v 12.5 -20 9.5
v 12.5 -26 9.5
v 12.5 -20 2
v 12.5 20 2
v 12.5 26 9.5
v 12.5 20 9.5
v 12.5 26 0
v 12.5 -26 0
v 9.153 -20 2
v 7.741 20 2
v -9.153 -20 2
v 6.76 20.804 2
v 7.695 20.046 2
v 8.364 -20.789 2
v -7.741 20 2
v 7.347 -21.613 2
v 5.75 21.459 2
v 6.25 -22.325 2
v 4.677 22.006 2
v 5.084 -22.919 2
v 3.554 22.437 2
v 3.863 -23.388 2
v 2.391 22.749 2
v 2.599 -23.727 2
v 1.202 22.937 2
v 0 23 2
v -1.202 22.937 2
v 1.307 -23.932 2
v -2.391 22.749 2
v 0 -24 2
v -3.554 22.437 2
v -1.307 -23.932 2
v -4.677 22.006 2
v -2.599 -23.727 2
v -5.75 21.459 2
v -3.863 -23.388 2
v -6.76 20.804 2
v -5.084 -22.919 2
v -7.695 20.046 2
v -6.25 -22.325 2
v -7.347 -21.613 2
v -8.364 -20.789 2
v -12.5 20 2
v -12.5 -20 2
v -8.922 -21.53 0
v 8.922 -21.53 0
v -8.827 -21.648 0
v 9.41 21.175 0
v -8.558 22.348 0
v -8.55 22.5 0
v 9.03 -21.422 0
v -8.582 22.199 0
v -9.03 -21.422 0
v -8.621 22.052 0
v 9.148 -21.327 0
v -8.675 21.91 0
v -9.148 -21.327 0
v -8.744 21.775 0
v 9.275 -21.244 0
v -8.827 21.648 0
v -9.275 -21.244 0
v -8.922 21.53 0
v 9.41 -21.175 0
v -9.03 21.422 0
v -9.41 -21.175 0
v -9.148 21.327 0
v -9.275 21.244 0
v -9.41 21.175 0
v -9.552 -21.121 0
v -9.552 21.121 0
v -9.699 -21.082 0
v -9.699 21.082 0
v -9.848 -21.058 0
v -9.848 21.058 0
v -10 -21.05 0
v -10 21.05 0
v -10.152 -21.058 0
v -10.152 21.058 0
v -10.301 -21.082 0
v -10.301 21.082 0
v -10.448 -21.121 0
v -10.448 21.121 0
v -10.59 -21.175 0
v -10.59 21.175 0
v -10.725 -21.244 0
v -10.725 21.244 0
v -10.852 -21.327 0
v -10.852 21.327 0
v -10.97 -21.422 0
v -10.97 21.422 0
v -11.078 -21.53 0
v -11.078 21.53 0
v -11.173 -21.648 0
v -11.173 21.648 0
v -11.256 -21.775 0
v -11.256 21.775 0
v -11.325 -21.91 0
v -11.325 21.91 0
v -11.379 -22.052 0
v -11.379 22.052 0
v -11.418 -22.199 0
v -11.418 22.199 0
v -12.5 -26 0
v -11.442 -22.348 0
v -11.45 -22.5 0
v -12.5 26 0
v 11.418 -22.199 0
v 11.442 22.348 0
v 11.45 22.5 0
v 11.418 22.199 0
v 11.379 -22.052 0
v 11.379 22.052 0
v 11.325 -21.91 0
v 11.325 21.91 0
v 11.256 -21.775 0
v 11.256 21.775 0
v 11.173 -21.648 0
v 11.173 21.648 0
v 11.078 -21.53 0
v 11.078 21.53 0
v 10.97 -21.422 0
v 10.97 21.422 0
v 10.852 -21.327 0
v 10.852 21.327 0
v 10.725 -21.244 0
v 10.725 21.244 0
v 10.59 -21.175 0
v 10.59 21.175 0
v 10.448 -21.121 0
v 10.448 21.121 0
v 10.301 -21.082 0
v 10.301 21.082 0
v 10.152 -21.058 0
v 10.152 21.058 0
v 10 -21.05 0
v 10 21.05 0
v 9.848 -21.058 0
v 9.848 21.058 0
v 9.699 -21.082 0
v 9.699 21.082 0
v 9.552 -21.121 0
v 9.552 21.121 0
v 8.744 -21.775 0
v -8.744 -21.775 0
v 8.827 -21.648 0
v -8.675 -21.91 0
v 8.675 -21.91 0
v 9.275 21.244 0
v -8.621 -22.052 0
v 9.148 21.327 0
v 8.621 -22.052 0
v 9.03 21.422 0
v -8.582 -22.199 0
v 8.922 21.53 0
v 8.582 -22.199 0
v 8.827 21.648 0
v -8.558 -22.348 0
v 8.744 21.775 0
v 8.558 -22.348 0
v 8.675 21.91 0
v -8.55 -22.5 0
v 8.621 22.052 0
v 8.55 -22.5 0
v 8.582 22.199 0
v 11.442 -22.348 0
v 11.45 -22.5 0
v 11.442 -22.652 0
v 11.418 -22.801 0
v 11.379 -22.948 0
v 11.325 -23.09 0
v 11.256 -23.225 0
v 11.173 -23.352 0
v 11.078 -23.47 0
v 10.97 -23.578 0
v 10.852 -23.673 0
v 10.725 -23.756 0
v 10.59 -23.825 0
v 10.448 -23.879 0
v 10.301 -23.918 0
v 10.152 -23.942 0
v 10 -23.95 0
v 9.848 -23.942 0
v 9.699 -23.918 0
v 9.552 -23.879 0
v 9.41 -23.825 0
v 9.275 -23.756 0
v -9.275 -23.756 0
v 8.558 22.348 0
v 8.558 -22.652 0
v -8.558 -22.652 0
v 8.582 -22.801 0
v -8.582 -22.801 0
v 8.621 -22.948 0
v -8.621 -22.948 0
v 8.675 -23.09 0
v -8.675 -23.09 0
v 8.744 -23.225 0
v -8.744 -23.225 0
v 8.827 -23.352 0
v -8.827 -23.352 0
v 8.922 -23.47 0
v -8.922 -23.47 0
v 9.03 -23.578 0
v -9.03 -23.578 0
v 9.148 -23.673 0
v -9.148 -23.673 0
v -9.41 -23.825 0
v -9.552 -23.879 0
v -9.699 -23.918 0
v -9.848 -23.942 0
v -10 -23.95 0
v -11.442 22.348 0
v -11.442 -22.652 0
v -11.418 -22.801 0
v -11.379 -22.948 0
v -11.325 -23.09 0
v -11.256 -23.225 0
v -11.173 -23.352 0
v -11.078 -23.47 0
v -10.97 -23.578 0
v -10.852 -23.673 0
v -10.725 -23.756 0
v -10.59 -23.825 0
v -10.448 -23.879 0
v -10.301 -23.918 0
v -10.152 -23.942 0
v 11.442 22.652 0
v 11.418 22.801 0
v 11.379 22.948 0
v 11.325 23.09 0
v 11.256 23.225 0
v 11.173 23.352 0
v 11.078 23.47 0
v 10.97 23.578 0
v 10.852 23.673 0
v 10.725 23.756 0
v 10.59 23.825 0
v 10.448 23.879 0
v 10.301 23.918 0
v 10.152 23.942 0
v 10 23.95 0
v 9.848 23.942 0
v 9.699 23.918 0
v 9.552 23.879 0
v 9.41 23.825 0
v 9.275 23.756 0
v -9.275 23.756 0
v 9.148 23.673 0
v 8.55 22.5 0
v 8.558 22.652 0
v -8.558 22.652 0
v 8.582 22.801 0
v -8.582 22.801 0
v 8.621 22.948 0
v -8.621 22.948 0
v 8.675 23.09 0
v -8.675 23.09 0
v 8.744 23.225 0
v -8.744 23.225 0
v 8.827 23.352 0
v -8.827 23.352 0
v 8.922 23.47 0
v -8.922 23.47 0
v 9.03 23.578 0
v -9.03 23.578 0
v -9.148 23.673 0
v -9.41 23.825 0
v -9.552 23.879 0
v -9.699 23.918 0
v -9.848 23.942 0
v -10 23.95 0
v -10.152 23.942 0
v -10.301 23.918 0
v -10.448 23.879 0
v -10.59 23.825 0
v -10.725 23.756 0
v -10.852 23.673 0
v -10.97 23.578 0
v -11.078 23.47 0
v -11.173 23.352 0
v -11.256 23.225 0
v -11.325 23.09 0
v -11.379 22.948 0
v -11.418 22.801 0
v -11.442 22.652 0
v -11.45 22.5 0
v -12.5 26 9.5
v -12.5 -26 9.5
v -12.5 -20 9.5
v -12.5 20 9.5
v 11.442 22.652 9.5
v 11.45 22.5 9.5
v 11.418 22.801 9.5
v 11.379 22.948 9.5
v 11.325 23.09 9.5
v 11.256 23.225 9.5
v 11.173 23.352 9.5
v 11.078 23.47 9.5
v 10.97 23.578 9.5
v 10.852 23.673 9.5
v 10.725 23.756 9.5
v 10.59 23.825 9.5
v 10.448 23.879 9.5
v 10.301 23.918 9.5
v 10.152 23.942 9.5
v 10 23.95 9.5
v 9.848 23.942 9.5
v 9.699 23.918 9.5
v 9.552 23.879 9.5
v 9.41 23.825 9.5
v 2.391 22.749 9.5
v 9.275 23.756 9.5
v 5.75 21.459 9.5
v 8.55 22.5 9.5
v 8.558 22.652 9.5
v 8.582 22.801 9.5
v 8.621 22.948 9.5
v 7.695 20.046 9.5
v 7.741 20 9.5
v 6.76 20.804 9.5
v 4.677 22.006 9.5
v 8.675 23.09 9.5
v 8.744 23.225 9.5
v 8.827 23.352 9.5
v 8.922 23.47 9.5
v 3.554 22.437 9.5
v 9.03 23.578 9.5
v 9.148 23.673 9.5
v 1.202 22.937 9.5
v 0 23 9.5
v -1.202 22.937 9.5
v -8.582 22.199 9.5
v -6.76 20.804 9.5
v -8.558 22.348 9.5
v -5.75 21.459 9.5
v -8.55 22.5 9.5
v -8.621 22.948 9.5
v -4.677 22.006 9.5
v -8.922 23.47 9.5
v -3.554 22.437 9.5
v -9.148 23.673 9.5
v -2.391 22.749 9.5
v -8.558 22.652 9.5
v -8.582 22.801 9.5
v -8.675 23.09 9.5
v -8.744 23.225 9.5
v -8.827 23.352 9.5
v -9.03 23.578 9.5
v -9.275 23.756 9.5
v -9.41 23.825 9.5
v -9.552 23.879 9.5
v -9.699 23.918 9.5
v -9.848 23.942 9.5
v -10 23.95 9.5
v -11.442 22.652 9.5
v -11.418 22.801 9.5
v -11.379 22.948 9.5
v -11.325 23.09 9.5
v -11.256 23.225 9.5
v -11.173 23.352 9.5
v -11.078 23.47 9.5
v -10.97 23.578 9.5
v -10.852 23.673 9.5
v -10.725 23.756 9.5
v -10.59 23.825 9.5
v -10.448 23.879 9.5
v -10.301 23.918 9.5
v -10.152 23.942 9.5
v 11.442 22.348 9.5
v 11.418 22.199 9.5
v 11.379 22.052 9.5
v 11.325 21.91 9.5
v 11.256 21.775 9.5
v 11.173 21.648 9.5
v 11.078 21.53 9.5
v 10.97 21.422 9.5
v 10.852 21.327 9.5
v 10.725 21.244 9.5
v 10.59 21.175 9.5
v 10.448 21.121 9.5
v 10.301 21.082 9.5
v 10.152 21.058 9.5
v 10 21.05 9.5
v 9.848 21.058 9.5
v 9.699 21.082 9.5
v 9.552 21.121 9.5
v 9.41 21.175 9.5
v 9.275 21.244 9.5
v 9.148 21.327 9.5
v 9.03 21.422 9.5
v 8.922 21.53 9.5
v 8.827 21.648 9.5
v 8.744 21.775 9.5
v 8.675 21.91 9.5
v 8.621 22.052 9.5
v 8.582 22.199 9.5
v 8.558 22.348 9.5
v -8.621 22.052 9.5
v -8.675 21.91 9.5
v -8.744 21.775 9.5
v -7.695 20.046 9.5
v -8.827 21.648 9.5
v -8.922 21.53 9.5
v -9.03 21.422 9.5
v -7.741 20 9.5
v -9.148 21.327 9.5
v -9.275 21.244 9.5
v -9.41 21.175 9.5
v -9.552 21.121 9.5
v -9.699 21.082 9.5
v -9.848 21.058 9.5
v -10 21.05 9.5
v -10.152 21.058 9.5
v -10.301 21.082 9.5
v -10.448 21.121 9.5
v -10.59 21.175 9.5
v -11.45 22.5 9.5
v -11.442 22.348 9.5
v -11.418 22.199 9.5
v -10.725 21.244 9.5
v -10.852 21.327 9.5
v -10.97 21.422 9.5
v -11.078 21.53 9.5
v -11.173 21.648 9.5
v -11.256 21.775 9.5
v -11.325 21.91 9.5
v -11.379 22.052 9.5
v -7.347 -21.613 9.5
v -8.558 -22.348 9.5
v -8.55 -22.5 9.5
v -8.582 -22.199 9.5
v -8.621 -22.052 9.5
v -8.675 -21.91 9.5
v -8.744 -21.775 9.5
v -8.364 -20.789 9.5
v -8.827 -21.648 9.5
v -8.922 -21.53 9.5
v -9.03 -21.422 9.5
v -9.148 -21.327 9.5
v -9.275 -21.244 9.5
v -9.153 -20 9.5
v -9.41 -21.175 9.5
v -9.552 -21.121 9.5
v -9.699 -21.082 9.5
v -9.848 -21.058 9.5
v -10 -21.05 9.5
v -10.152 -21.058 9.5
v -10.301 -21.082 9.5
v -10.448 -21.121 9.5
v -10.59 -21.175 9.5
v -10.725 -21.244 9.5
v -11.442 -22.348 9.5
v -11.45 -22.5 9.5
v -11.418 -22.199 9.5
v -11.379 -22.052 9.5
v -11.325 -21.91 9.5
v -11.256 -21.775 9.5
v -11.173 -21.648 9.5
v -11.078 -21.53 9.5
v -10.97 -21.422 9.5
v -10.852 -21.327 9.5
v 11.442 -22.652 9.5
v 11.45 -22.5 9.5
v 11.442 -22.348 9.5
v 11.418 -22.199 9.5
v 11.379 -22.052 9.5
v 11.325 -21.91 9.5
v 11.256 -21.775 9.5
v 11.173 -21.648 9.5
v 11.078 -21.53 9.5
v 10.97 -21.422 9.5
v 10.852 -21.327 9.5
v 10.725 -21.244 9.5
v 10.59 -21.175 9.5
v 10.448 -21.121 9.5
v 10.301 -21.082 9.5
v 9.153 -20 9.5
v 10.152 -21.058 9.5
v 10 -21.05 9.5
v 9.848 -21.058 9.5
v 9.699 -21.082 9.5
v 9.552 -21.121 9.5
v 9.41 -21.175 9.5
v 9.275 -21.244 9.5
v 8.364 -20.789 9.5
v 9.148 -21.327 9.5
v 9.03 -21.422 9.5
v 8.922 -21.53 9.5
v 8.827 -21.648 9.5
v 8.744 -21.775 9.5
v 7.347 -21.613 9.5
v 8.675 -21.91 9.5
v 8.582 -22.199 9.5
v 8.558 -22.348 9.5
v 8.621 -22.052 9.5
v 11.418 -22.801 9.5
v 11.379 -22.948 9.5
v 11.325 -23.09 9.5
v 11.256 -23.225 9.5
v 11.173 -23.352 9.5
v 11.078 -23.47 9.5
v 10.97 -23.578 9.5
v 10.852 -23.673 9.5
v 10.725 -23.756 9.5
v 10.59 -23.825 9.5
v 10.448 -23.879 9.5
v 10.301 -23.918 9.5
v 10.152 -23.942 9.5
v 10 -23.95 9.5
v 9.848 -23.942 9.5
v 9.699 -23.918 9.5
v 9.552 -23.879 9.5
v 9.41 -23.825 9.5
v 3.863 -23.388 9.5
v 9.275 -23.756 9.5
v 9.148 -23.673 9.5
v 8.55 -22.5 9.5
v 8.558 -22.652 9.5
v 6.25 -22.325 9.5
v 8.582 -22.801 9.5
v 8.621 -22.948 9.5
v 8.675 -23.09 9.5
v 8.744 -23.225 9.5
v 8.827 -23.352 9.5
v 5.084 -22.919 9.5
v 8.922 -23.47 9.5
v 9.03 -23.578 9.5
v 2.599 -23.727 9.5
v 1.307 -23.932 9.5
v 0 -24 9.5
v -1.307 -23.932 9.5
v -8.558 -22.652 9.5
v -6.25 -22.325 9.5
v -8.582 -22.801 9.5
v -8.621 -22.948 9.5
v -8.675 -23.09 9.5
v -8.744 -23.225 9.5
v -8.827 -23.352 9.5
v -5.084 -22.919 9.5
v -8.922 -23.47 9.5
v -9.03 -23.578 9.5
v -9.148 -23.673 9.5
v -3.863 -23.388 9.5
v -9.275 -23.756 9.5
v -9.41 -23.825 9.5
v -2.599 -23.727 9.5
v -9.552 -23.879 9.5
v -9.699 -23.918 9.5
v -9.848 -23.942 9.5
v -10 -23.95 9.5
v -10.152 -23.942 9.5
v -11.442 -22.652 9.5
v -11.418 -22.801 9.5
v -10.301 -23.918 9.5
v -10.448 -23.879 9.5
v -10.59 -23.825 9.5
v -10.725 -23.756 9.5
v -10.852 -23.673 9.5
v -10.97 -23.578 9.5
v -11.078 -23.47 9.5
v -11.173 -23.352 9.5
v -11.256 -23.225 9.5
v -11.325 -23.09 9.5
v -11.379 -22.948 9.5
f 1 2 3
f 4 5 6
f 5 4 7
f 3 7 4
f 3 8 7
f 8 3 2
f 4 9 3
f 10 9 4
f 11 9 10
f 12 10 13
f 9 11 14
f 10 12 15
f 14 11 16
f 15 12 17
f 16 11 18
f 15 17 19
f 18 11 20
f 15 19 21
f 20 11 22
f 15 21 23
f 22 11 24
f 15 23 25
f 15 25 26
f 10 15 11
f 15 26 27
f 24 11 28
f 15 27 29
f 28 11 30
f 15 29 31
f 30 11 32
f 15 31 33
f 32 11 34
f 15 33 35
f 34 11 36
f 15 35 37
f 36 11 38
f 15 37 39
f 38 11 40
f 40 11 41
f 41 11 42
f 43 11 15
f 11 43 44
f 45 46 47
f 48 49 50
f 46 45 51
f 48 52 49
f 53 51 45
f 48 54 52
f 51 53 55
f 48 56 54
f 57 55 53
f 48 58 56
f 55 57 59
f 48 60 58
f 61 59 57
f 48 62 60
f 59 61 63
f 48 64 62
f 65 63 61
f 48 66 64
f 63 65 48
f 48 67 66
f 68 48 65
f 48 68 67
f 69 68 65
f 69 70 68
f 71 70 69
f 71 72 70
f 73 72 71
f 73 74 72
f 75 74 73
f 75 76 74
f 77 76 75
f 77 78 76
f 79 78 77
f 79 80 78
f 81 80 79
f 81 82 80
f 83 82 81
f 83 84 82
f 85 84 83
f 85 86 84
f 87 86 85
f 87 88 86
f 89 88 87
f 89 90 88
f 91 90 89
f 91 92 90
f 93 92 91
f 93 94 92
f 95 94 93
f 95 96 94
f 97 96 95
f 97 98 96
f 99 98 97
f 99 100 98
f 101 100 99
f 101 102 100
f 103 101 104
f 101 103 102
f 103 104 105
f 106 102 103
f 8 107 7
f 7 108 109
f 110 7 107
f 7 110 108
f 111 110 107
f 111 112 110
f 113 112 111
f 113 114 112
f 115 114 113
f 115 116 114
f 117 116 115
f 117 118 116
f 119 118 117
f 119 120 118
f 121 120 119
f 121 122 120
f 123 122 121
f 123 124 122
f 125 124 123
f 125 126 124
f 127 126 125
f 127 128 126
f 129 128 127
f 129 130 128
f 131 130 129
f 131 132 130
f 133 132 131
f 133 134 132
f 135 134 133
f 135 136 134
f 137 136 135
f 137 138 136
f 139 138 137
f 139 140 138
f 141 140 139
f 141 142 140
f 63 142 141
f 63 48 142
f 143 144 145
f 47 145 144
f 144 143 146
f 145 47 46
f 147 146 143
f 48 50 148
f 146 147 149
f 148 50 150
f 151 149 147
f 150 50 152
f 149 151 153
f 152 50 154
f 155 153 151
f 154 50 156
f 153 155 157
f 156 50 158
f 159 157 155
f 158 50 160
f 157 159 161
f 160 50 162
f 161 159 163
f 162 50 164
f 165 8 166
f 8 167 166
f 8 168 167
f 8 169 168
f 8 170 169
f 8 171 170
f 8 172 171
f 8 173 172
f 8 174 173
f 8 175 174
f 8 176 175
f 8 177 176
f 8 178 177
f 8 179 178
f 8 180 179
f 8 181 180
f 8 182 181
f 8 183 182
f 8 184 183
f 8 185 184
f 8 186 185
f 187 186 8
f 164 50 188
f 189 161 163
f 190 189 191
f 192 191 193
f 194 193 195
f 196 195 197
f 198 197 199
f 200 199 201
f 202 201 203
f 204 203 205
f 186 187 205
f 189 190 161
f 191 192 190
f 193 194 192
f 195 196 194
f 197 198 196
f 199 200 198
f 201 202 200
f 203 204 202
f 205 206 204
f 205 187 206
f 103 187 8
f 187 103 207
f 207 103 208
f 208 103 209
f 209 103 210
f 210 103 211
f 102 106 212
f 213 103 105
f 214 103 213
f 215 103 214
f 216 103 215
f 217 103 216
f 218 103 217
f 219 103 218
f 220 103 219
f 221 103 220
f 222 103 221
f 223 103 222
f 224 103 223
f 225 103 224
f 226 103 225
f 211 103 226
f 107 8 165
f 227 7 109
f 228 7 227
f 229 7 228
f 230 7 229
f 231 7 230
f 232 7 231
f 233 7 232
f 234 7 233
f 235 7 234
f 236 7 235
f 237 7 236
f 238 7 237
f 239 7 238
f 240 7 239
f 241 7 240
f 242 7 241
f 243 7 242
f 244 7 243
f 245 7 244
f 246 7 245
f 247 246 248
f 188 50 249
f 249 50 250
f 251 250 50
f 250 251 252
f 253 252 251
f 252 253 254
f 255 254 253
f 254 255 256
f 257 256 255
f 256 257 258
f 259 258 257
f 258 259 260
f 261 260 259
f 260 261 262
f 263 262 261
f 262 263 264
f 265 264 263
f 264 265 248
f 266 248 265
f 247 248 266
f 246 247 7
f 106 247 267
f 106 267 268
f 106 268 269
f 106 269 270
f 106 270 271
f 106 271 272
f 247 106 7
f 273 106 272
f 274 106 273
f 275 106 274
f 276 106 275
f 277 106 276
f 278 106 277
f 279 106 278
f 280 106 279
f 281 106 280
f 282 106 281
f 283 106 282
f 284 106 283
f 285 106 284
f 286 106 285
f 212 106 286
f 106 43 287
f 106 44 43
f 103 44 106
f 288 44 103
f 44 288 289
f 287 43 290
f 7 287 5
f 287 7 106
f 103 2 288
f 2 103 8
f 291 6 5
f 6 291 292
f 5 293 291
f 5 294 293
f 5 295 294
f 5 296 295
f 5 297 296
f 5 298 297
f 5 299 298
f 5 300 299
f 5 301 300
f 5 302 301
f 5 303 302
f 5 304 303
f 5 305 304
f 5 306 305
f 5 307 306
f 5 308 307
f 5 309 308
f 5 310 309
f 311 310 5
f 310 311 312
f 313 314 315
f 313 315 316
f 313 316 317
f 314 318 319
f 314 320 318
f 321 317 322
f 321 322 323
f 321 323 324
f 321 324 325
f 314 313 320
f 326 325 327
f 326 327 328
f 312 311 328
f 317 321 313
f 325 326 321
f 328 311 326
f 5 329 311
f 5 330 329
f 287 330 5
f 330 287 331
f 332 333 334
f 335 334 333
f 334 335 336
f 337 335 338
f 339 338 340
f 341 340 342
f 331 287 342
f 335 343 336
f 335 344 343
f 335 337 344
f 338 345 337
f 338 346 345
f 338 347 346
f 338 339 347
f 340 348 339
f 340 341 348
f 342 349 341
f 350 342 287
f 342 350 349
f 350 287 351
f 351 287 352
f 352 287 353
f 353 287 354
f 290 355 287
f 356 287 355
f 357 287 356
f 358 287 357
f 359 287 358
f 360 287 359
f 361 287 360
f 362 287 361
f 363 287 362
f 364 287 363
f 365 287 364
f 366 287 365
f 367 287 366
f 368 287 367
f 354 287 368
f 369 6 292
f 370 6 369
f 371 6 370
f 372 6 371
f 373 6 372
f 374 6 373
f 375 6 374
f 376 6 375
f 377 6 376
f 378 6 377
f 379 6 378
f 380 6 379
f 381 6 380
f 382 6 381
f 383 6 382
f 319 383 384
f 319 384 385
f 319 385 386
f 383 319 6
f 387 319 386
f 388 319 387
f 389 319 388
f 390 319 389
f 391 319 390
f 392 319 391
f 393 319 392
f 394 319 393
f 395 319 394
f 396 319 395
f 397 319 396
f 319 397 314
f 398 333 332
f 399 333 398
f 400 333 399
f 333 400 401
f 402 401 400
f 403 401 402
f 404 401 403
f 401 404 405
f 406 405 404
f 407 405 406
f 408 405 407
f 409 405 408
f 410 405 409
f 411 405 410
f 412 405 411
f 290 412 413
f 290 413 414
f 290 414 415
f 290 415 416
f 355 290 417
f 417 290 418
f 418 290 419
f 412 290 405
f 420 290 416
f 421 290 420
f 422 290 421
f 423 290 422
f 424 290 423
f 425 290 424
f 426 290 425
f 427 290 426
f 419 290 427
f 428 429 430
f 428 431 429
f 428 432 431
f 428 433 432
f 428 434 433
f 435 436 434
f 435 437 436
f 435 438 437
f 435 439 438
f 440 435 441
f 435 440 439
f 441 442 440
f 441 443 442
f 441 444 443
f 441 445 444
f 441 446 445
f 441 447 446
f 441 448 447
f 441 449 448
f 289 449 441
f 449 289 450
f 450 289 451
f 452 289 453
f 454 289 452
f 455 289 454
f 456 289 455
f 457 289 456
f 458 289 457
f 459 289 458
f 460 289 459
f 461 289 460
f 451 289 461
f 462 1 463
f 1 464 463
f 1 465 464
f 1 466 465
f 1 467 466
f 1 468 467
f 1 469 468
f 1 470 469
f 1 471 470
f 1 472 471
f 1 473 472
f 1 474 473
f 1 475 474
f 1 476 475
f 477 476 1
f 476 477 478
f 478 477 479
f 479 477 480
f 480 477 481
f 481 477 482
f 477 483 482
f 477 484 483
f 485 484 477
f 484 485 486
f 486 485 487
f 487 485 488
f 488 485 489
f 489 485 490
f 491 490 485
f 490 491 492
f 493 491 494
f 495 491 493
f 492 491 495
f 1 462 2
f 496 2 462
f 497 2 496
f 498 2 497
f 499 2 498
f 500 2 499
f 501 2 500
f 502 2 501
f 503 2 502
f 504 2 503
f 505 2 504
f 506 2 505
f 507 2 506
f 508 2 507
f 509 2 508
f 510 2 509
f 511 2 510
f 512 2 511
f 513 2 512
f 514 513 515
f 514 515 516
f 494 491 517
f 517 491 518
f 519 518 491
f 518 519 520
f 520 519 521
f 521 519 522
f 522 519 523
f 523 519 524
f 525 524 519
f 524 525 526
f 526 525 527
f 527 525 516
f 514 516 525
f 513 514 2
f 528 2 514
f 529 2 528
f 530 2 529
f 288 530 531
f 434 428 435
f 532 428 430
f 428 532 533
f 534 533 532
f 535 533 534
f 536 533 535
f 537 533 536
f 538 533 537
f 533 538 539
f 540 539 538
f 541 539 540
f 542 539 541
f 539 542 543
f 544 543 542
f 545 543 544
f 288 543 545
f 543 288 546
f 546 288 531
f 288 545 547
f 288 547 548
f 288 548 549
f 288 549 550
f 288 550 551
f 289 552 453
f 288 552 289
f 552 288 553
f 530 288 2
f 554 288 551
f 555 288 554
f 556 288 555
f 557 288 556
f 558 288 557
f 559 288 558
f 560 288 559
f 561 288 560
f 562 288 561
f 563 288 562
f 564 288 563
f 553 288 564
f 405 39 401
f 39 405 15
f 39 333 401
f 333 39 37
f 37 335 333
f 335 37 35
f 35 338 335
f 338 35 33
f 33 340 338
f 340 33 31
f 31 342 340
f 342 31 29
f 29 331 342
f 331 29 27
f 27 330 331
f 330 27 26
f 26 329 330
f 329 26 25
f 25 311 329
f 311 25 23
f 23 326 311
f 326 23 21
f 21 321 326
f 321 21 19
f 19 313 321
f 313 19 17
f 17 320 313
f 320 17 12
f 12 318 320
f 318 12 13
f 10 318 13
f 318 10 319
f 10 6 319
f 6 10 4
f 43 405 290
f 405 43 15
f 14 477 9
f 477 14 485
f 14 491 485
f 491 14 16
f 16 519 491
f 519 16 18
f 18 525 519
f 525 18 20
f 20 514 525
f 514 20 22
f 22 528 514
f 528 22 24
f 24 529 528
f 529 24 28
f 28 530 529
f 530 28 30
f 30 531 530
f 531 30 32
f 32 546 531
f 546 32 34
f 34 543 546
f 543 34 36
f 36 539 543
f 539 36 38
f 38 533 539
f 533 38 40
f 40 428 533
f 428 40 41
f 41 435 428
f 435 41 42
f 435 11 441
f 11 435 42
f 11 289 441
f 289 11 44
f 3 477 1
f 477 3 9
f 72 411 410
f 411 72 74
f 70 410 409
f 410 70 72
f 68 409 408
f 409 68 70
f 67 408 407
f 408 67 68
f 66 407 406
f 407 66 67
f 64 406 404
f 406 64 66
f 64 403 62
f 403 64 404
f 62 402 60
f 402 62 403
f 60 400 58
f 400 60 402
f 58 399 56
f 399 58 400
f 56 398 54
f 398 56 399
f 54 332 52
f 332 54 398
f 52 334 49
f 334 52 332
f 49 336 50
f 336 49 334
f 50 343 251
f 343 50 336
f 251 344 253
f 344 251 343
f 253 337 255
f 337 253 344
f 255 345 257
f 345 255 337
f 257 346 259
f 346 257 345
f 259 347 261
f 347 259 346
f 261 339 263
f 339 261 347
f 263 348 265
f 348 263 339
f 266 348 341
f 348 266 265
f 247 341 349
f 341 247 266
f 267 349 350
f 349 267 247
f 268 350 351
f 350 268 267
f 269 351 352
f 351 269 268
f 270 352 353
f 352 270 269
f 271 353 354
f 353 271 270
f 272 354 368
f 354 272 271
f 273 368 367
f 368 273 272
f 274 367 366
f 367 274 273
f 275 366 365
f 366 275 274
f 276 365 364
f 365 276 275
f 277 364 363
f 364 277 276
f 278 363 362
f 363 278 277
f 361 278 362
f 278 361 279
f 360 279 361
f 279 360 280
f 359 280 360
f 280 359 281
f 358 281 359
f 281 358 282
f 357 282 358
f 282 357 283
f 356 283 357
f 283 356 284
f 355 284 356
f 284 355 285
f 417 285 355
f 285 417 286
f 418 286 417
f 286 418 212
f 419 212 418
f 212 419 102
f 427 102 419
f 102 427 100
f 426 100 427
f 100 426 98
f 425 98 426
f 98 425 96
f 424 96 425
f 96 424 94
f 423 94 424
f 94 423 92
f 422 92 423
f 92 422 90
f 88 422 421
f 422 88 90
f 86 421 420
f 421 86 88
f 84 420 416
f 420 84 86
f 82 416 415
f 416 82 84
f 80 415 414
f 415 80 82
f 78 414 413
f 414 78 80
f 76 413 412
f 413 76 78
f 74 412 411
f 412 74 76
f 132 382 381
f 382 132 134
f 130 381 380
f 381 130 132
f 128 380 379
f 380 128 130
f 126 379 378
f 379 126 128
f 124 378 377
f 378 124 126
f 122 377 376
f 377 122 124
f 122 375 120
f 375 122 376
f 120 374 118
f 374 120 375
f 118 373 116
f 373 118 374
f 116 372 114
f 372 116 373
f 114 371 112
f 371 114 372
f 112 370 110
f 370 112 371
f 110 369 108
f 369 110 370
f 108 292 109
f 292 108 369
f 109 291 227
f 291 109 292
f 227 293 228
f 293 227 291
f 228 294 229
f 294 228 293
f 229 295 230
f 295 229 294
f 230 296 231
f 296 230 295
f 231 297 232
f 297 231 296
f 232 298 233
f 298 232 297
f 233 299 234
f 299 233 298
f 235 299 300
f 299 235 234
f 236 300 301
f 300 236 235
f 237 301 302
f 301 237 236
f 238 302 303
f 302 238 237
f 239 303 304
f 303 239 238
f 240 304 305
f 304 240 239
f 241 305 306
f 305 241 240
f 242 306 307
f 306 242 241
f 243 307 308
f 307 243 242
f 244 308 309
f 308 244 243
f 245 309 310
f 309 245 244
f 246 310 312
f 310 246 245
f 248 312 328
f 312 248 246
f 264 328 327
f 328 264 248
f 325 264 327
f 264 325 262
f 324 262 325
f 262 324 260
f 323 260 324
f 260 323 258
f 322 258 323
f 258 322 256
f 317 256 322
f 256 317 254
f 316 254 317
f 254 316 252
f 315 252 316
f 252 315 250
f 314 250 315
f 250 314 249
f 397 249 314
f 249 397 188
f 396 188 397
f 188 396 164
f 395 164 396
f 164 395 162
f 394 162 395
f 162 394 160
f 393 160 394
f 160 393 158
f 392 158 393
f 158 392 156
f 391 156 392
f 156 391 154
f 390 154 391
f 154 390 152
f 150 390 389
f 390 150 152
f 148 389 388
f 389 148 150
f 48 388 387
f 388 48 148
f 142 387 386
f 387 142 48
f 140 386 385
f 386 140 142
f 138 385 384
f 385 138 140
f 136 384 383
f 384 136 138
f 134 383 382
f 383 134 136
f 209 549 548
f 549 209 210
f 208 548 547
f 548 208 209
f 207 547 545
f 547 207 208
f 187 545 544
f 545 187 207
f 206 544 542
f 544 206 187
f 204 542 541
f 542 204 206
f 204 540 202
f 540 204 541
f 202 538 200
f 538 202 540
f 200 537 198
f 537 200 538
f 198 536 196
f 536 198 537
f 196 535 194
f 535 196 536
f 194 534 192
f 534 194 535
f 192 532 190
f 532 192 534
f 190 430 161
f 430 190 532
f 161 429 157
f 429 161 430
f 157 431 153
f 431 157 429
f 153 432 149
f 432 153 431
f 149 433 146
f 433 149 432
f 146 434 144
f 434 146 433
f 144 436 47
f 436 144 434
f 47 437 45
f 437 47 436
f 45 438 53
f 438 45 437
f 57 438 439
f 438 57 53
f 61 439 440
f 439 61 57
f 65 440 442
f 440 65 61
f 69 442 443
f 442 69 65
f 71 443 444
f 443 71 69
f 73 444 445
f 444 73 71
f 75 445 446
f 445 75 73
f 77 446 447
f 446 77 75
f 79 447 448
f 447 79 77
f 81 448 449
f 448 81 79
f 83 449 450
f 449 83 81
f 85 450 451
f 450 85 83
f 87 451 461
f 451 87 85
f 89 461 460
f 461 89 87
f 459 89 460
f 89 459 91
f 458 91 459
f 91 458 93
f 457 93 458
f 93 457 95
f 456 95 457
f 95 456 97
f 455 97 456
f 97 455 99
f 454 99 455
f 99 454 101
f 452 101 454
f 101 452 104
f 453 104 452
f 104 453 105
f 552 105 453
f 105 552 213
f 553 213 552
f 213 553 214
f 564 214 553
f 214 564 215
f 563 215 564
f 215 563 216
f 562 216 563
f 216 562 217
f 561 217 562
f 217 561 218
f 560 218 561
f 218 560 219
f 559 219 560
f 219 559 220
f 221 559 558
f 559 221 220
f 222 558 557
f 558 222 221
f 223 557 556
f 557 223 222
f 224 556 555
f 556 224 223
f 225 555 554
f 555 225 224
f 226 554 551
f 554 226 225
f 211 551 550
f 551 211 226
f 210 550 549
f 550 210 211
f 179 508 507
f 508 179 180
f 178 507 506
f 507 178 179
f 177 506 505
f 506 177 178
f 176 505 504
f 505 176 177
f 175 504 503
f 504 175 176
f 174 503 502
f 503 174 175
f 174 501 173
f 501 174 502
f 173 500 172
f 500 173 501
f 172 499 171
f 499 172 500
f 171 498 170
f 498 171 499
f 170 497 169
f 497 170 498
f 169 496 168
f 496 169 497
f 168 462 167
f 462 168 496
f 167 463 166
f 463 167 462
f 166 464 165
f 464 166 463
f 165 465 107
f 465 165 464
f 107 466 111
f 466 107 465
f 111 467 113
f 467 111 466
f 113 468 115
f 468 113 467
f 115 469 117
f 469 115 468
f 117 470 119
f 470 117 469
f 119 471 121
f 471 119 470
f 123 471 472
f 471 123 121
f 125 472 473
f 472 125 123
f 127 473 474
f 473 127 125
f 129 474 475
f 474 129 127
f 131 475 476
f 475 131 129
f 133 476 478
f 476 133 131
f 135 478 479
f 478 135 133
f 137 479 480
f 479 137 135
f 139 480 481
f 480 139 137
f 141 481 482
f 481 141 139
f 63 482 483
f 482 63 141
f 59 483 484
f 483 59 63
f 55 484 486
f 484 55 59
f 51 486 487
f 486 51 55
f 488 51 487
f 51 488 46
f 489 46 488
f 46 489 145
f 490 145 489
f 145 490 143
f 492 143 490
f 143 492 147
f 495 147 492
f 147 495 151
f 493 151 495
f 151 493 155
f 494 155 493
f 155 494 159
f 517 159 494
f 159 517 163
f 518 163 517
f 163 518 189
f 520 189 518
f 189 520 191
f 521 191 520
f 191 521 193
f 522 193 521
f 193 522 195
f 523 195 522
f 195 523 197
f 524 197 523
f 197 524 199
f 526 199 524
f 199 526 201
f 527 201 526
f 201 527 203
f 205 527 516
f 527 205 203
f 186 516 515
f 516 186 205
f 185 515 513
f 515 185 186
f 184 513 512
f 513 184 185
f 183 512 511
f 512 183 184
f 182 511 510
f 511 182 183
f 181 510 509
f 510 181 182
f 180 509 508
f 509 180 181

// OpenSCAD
$fn=60;

cavity_height = 52;
cavity_width  = 25;

fan_diameter  = 23;

screw_translation_y = 45/2;
screw_translation_x = 20/2;
screw_head_height = 2;

base_height = 2;
extension_height = 7.5;

difference()
{
    union()
    {
        translate([0, 0, base_height/2])
        cube([cavity_width, cavity_height, base_height], center=true);

        translate([0, 0, base_height])
        linear_extrude(extension_height)
        difference()
        {
            union()
            {
                square([cavity_width, cavity_height], center=true);
            }

            union()
            {
                hull()
                {
                    translate([0, fan_diameter/2, 0])
                    circle(d=fan_diameter);

                    translate([0, -fan_diameter/2, 0])
                    circle(d=25);
                }
                
                square([cavity_width, 40], center=true);
            }
        }
    }
    union()
    {
        linear_extrude(base_height + extension_height)
        for(x_translation = [-screw_translation_x, screw_translation_x])
        {
            for(y_translation = [-screw_translation_y, screw_translation_y])
            {
                translate([x_translation, y_translation, 0])
                circle(d=2.9);
            }
        }
        
//        linear_extrude(screw_head_height)
//        for(x_translation = [-screw_translation_x, screw_translation_x])
//        {
//            for(y_translation = [-screw_translation_y, screw_translation_y])
//            {
//                translate([x_translation, y_translation, 0])
//                square([5, 5], center=true);
//            }
//        }
    }
}
